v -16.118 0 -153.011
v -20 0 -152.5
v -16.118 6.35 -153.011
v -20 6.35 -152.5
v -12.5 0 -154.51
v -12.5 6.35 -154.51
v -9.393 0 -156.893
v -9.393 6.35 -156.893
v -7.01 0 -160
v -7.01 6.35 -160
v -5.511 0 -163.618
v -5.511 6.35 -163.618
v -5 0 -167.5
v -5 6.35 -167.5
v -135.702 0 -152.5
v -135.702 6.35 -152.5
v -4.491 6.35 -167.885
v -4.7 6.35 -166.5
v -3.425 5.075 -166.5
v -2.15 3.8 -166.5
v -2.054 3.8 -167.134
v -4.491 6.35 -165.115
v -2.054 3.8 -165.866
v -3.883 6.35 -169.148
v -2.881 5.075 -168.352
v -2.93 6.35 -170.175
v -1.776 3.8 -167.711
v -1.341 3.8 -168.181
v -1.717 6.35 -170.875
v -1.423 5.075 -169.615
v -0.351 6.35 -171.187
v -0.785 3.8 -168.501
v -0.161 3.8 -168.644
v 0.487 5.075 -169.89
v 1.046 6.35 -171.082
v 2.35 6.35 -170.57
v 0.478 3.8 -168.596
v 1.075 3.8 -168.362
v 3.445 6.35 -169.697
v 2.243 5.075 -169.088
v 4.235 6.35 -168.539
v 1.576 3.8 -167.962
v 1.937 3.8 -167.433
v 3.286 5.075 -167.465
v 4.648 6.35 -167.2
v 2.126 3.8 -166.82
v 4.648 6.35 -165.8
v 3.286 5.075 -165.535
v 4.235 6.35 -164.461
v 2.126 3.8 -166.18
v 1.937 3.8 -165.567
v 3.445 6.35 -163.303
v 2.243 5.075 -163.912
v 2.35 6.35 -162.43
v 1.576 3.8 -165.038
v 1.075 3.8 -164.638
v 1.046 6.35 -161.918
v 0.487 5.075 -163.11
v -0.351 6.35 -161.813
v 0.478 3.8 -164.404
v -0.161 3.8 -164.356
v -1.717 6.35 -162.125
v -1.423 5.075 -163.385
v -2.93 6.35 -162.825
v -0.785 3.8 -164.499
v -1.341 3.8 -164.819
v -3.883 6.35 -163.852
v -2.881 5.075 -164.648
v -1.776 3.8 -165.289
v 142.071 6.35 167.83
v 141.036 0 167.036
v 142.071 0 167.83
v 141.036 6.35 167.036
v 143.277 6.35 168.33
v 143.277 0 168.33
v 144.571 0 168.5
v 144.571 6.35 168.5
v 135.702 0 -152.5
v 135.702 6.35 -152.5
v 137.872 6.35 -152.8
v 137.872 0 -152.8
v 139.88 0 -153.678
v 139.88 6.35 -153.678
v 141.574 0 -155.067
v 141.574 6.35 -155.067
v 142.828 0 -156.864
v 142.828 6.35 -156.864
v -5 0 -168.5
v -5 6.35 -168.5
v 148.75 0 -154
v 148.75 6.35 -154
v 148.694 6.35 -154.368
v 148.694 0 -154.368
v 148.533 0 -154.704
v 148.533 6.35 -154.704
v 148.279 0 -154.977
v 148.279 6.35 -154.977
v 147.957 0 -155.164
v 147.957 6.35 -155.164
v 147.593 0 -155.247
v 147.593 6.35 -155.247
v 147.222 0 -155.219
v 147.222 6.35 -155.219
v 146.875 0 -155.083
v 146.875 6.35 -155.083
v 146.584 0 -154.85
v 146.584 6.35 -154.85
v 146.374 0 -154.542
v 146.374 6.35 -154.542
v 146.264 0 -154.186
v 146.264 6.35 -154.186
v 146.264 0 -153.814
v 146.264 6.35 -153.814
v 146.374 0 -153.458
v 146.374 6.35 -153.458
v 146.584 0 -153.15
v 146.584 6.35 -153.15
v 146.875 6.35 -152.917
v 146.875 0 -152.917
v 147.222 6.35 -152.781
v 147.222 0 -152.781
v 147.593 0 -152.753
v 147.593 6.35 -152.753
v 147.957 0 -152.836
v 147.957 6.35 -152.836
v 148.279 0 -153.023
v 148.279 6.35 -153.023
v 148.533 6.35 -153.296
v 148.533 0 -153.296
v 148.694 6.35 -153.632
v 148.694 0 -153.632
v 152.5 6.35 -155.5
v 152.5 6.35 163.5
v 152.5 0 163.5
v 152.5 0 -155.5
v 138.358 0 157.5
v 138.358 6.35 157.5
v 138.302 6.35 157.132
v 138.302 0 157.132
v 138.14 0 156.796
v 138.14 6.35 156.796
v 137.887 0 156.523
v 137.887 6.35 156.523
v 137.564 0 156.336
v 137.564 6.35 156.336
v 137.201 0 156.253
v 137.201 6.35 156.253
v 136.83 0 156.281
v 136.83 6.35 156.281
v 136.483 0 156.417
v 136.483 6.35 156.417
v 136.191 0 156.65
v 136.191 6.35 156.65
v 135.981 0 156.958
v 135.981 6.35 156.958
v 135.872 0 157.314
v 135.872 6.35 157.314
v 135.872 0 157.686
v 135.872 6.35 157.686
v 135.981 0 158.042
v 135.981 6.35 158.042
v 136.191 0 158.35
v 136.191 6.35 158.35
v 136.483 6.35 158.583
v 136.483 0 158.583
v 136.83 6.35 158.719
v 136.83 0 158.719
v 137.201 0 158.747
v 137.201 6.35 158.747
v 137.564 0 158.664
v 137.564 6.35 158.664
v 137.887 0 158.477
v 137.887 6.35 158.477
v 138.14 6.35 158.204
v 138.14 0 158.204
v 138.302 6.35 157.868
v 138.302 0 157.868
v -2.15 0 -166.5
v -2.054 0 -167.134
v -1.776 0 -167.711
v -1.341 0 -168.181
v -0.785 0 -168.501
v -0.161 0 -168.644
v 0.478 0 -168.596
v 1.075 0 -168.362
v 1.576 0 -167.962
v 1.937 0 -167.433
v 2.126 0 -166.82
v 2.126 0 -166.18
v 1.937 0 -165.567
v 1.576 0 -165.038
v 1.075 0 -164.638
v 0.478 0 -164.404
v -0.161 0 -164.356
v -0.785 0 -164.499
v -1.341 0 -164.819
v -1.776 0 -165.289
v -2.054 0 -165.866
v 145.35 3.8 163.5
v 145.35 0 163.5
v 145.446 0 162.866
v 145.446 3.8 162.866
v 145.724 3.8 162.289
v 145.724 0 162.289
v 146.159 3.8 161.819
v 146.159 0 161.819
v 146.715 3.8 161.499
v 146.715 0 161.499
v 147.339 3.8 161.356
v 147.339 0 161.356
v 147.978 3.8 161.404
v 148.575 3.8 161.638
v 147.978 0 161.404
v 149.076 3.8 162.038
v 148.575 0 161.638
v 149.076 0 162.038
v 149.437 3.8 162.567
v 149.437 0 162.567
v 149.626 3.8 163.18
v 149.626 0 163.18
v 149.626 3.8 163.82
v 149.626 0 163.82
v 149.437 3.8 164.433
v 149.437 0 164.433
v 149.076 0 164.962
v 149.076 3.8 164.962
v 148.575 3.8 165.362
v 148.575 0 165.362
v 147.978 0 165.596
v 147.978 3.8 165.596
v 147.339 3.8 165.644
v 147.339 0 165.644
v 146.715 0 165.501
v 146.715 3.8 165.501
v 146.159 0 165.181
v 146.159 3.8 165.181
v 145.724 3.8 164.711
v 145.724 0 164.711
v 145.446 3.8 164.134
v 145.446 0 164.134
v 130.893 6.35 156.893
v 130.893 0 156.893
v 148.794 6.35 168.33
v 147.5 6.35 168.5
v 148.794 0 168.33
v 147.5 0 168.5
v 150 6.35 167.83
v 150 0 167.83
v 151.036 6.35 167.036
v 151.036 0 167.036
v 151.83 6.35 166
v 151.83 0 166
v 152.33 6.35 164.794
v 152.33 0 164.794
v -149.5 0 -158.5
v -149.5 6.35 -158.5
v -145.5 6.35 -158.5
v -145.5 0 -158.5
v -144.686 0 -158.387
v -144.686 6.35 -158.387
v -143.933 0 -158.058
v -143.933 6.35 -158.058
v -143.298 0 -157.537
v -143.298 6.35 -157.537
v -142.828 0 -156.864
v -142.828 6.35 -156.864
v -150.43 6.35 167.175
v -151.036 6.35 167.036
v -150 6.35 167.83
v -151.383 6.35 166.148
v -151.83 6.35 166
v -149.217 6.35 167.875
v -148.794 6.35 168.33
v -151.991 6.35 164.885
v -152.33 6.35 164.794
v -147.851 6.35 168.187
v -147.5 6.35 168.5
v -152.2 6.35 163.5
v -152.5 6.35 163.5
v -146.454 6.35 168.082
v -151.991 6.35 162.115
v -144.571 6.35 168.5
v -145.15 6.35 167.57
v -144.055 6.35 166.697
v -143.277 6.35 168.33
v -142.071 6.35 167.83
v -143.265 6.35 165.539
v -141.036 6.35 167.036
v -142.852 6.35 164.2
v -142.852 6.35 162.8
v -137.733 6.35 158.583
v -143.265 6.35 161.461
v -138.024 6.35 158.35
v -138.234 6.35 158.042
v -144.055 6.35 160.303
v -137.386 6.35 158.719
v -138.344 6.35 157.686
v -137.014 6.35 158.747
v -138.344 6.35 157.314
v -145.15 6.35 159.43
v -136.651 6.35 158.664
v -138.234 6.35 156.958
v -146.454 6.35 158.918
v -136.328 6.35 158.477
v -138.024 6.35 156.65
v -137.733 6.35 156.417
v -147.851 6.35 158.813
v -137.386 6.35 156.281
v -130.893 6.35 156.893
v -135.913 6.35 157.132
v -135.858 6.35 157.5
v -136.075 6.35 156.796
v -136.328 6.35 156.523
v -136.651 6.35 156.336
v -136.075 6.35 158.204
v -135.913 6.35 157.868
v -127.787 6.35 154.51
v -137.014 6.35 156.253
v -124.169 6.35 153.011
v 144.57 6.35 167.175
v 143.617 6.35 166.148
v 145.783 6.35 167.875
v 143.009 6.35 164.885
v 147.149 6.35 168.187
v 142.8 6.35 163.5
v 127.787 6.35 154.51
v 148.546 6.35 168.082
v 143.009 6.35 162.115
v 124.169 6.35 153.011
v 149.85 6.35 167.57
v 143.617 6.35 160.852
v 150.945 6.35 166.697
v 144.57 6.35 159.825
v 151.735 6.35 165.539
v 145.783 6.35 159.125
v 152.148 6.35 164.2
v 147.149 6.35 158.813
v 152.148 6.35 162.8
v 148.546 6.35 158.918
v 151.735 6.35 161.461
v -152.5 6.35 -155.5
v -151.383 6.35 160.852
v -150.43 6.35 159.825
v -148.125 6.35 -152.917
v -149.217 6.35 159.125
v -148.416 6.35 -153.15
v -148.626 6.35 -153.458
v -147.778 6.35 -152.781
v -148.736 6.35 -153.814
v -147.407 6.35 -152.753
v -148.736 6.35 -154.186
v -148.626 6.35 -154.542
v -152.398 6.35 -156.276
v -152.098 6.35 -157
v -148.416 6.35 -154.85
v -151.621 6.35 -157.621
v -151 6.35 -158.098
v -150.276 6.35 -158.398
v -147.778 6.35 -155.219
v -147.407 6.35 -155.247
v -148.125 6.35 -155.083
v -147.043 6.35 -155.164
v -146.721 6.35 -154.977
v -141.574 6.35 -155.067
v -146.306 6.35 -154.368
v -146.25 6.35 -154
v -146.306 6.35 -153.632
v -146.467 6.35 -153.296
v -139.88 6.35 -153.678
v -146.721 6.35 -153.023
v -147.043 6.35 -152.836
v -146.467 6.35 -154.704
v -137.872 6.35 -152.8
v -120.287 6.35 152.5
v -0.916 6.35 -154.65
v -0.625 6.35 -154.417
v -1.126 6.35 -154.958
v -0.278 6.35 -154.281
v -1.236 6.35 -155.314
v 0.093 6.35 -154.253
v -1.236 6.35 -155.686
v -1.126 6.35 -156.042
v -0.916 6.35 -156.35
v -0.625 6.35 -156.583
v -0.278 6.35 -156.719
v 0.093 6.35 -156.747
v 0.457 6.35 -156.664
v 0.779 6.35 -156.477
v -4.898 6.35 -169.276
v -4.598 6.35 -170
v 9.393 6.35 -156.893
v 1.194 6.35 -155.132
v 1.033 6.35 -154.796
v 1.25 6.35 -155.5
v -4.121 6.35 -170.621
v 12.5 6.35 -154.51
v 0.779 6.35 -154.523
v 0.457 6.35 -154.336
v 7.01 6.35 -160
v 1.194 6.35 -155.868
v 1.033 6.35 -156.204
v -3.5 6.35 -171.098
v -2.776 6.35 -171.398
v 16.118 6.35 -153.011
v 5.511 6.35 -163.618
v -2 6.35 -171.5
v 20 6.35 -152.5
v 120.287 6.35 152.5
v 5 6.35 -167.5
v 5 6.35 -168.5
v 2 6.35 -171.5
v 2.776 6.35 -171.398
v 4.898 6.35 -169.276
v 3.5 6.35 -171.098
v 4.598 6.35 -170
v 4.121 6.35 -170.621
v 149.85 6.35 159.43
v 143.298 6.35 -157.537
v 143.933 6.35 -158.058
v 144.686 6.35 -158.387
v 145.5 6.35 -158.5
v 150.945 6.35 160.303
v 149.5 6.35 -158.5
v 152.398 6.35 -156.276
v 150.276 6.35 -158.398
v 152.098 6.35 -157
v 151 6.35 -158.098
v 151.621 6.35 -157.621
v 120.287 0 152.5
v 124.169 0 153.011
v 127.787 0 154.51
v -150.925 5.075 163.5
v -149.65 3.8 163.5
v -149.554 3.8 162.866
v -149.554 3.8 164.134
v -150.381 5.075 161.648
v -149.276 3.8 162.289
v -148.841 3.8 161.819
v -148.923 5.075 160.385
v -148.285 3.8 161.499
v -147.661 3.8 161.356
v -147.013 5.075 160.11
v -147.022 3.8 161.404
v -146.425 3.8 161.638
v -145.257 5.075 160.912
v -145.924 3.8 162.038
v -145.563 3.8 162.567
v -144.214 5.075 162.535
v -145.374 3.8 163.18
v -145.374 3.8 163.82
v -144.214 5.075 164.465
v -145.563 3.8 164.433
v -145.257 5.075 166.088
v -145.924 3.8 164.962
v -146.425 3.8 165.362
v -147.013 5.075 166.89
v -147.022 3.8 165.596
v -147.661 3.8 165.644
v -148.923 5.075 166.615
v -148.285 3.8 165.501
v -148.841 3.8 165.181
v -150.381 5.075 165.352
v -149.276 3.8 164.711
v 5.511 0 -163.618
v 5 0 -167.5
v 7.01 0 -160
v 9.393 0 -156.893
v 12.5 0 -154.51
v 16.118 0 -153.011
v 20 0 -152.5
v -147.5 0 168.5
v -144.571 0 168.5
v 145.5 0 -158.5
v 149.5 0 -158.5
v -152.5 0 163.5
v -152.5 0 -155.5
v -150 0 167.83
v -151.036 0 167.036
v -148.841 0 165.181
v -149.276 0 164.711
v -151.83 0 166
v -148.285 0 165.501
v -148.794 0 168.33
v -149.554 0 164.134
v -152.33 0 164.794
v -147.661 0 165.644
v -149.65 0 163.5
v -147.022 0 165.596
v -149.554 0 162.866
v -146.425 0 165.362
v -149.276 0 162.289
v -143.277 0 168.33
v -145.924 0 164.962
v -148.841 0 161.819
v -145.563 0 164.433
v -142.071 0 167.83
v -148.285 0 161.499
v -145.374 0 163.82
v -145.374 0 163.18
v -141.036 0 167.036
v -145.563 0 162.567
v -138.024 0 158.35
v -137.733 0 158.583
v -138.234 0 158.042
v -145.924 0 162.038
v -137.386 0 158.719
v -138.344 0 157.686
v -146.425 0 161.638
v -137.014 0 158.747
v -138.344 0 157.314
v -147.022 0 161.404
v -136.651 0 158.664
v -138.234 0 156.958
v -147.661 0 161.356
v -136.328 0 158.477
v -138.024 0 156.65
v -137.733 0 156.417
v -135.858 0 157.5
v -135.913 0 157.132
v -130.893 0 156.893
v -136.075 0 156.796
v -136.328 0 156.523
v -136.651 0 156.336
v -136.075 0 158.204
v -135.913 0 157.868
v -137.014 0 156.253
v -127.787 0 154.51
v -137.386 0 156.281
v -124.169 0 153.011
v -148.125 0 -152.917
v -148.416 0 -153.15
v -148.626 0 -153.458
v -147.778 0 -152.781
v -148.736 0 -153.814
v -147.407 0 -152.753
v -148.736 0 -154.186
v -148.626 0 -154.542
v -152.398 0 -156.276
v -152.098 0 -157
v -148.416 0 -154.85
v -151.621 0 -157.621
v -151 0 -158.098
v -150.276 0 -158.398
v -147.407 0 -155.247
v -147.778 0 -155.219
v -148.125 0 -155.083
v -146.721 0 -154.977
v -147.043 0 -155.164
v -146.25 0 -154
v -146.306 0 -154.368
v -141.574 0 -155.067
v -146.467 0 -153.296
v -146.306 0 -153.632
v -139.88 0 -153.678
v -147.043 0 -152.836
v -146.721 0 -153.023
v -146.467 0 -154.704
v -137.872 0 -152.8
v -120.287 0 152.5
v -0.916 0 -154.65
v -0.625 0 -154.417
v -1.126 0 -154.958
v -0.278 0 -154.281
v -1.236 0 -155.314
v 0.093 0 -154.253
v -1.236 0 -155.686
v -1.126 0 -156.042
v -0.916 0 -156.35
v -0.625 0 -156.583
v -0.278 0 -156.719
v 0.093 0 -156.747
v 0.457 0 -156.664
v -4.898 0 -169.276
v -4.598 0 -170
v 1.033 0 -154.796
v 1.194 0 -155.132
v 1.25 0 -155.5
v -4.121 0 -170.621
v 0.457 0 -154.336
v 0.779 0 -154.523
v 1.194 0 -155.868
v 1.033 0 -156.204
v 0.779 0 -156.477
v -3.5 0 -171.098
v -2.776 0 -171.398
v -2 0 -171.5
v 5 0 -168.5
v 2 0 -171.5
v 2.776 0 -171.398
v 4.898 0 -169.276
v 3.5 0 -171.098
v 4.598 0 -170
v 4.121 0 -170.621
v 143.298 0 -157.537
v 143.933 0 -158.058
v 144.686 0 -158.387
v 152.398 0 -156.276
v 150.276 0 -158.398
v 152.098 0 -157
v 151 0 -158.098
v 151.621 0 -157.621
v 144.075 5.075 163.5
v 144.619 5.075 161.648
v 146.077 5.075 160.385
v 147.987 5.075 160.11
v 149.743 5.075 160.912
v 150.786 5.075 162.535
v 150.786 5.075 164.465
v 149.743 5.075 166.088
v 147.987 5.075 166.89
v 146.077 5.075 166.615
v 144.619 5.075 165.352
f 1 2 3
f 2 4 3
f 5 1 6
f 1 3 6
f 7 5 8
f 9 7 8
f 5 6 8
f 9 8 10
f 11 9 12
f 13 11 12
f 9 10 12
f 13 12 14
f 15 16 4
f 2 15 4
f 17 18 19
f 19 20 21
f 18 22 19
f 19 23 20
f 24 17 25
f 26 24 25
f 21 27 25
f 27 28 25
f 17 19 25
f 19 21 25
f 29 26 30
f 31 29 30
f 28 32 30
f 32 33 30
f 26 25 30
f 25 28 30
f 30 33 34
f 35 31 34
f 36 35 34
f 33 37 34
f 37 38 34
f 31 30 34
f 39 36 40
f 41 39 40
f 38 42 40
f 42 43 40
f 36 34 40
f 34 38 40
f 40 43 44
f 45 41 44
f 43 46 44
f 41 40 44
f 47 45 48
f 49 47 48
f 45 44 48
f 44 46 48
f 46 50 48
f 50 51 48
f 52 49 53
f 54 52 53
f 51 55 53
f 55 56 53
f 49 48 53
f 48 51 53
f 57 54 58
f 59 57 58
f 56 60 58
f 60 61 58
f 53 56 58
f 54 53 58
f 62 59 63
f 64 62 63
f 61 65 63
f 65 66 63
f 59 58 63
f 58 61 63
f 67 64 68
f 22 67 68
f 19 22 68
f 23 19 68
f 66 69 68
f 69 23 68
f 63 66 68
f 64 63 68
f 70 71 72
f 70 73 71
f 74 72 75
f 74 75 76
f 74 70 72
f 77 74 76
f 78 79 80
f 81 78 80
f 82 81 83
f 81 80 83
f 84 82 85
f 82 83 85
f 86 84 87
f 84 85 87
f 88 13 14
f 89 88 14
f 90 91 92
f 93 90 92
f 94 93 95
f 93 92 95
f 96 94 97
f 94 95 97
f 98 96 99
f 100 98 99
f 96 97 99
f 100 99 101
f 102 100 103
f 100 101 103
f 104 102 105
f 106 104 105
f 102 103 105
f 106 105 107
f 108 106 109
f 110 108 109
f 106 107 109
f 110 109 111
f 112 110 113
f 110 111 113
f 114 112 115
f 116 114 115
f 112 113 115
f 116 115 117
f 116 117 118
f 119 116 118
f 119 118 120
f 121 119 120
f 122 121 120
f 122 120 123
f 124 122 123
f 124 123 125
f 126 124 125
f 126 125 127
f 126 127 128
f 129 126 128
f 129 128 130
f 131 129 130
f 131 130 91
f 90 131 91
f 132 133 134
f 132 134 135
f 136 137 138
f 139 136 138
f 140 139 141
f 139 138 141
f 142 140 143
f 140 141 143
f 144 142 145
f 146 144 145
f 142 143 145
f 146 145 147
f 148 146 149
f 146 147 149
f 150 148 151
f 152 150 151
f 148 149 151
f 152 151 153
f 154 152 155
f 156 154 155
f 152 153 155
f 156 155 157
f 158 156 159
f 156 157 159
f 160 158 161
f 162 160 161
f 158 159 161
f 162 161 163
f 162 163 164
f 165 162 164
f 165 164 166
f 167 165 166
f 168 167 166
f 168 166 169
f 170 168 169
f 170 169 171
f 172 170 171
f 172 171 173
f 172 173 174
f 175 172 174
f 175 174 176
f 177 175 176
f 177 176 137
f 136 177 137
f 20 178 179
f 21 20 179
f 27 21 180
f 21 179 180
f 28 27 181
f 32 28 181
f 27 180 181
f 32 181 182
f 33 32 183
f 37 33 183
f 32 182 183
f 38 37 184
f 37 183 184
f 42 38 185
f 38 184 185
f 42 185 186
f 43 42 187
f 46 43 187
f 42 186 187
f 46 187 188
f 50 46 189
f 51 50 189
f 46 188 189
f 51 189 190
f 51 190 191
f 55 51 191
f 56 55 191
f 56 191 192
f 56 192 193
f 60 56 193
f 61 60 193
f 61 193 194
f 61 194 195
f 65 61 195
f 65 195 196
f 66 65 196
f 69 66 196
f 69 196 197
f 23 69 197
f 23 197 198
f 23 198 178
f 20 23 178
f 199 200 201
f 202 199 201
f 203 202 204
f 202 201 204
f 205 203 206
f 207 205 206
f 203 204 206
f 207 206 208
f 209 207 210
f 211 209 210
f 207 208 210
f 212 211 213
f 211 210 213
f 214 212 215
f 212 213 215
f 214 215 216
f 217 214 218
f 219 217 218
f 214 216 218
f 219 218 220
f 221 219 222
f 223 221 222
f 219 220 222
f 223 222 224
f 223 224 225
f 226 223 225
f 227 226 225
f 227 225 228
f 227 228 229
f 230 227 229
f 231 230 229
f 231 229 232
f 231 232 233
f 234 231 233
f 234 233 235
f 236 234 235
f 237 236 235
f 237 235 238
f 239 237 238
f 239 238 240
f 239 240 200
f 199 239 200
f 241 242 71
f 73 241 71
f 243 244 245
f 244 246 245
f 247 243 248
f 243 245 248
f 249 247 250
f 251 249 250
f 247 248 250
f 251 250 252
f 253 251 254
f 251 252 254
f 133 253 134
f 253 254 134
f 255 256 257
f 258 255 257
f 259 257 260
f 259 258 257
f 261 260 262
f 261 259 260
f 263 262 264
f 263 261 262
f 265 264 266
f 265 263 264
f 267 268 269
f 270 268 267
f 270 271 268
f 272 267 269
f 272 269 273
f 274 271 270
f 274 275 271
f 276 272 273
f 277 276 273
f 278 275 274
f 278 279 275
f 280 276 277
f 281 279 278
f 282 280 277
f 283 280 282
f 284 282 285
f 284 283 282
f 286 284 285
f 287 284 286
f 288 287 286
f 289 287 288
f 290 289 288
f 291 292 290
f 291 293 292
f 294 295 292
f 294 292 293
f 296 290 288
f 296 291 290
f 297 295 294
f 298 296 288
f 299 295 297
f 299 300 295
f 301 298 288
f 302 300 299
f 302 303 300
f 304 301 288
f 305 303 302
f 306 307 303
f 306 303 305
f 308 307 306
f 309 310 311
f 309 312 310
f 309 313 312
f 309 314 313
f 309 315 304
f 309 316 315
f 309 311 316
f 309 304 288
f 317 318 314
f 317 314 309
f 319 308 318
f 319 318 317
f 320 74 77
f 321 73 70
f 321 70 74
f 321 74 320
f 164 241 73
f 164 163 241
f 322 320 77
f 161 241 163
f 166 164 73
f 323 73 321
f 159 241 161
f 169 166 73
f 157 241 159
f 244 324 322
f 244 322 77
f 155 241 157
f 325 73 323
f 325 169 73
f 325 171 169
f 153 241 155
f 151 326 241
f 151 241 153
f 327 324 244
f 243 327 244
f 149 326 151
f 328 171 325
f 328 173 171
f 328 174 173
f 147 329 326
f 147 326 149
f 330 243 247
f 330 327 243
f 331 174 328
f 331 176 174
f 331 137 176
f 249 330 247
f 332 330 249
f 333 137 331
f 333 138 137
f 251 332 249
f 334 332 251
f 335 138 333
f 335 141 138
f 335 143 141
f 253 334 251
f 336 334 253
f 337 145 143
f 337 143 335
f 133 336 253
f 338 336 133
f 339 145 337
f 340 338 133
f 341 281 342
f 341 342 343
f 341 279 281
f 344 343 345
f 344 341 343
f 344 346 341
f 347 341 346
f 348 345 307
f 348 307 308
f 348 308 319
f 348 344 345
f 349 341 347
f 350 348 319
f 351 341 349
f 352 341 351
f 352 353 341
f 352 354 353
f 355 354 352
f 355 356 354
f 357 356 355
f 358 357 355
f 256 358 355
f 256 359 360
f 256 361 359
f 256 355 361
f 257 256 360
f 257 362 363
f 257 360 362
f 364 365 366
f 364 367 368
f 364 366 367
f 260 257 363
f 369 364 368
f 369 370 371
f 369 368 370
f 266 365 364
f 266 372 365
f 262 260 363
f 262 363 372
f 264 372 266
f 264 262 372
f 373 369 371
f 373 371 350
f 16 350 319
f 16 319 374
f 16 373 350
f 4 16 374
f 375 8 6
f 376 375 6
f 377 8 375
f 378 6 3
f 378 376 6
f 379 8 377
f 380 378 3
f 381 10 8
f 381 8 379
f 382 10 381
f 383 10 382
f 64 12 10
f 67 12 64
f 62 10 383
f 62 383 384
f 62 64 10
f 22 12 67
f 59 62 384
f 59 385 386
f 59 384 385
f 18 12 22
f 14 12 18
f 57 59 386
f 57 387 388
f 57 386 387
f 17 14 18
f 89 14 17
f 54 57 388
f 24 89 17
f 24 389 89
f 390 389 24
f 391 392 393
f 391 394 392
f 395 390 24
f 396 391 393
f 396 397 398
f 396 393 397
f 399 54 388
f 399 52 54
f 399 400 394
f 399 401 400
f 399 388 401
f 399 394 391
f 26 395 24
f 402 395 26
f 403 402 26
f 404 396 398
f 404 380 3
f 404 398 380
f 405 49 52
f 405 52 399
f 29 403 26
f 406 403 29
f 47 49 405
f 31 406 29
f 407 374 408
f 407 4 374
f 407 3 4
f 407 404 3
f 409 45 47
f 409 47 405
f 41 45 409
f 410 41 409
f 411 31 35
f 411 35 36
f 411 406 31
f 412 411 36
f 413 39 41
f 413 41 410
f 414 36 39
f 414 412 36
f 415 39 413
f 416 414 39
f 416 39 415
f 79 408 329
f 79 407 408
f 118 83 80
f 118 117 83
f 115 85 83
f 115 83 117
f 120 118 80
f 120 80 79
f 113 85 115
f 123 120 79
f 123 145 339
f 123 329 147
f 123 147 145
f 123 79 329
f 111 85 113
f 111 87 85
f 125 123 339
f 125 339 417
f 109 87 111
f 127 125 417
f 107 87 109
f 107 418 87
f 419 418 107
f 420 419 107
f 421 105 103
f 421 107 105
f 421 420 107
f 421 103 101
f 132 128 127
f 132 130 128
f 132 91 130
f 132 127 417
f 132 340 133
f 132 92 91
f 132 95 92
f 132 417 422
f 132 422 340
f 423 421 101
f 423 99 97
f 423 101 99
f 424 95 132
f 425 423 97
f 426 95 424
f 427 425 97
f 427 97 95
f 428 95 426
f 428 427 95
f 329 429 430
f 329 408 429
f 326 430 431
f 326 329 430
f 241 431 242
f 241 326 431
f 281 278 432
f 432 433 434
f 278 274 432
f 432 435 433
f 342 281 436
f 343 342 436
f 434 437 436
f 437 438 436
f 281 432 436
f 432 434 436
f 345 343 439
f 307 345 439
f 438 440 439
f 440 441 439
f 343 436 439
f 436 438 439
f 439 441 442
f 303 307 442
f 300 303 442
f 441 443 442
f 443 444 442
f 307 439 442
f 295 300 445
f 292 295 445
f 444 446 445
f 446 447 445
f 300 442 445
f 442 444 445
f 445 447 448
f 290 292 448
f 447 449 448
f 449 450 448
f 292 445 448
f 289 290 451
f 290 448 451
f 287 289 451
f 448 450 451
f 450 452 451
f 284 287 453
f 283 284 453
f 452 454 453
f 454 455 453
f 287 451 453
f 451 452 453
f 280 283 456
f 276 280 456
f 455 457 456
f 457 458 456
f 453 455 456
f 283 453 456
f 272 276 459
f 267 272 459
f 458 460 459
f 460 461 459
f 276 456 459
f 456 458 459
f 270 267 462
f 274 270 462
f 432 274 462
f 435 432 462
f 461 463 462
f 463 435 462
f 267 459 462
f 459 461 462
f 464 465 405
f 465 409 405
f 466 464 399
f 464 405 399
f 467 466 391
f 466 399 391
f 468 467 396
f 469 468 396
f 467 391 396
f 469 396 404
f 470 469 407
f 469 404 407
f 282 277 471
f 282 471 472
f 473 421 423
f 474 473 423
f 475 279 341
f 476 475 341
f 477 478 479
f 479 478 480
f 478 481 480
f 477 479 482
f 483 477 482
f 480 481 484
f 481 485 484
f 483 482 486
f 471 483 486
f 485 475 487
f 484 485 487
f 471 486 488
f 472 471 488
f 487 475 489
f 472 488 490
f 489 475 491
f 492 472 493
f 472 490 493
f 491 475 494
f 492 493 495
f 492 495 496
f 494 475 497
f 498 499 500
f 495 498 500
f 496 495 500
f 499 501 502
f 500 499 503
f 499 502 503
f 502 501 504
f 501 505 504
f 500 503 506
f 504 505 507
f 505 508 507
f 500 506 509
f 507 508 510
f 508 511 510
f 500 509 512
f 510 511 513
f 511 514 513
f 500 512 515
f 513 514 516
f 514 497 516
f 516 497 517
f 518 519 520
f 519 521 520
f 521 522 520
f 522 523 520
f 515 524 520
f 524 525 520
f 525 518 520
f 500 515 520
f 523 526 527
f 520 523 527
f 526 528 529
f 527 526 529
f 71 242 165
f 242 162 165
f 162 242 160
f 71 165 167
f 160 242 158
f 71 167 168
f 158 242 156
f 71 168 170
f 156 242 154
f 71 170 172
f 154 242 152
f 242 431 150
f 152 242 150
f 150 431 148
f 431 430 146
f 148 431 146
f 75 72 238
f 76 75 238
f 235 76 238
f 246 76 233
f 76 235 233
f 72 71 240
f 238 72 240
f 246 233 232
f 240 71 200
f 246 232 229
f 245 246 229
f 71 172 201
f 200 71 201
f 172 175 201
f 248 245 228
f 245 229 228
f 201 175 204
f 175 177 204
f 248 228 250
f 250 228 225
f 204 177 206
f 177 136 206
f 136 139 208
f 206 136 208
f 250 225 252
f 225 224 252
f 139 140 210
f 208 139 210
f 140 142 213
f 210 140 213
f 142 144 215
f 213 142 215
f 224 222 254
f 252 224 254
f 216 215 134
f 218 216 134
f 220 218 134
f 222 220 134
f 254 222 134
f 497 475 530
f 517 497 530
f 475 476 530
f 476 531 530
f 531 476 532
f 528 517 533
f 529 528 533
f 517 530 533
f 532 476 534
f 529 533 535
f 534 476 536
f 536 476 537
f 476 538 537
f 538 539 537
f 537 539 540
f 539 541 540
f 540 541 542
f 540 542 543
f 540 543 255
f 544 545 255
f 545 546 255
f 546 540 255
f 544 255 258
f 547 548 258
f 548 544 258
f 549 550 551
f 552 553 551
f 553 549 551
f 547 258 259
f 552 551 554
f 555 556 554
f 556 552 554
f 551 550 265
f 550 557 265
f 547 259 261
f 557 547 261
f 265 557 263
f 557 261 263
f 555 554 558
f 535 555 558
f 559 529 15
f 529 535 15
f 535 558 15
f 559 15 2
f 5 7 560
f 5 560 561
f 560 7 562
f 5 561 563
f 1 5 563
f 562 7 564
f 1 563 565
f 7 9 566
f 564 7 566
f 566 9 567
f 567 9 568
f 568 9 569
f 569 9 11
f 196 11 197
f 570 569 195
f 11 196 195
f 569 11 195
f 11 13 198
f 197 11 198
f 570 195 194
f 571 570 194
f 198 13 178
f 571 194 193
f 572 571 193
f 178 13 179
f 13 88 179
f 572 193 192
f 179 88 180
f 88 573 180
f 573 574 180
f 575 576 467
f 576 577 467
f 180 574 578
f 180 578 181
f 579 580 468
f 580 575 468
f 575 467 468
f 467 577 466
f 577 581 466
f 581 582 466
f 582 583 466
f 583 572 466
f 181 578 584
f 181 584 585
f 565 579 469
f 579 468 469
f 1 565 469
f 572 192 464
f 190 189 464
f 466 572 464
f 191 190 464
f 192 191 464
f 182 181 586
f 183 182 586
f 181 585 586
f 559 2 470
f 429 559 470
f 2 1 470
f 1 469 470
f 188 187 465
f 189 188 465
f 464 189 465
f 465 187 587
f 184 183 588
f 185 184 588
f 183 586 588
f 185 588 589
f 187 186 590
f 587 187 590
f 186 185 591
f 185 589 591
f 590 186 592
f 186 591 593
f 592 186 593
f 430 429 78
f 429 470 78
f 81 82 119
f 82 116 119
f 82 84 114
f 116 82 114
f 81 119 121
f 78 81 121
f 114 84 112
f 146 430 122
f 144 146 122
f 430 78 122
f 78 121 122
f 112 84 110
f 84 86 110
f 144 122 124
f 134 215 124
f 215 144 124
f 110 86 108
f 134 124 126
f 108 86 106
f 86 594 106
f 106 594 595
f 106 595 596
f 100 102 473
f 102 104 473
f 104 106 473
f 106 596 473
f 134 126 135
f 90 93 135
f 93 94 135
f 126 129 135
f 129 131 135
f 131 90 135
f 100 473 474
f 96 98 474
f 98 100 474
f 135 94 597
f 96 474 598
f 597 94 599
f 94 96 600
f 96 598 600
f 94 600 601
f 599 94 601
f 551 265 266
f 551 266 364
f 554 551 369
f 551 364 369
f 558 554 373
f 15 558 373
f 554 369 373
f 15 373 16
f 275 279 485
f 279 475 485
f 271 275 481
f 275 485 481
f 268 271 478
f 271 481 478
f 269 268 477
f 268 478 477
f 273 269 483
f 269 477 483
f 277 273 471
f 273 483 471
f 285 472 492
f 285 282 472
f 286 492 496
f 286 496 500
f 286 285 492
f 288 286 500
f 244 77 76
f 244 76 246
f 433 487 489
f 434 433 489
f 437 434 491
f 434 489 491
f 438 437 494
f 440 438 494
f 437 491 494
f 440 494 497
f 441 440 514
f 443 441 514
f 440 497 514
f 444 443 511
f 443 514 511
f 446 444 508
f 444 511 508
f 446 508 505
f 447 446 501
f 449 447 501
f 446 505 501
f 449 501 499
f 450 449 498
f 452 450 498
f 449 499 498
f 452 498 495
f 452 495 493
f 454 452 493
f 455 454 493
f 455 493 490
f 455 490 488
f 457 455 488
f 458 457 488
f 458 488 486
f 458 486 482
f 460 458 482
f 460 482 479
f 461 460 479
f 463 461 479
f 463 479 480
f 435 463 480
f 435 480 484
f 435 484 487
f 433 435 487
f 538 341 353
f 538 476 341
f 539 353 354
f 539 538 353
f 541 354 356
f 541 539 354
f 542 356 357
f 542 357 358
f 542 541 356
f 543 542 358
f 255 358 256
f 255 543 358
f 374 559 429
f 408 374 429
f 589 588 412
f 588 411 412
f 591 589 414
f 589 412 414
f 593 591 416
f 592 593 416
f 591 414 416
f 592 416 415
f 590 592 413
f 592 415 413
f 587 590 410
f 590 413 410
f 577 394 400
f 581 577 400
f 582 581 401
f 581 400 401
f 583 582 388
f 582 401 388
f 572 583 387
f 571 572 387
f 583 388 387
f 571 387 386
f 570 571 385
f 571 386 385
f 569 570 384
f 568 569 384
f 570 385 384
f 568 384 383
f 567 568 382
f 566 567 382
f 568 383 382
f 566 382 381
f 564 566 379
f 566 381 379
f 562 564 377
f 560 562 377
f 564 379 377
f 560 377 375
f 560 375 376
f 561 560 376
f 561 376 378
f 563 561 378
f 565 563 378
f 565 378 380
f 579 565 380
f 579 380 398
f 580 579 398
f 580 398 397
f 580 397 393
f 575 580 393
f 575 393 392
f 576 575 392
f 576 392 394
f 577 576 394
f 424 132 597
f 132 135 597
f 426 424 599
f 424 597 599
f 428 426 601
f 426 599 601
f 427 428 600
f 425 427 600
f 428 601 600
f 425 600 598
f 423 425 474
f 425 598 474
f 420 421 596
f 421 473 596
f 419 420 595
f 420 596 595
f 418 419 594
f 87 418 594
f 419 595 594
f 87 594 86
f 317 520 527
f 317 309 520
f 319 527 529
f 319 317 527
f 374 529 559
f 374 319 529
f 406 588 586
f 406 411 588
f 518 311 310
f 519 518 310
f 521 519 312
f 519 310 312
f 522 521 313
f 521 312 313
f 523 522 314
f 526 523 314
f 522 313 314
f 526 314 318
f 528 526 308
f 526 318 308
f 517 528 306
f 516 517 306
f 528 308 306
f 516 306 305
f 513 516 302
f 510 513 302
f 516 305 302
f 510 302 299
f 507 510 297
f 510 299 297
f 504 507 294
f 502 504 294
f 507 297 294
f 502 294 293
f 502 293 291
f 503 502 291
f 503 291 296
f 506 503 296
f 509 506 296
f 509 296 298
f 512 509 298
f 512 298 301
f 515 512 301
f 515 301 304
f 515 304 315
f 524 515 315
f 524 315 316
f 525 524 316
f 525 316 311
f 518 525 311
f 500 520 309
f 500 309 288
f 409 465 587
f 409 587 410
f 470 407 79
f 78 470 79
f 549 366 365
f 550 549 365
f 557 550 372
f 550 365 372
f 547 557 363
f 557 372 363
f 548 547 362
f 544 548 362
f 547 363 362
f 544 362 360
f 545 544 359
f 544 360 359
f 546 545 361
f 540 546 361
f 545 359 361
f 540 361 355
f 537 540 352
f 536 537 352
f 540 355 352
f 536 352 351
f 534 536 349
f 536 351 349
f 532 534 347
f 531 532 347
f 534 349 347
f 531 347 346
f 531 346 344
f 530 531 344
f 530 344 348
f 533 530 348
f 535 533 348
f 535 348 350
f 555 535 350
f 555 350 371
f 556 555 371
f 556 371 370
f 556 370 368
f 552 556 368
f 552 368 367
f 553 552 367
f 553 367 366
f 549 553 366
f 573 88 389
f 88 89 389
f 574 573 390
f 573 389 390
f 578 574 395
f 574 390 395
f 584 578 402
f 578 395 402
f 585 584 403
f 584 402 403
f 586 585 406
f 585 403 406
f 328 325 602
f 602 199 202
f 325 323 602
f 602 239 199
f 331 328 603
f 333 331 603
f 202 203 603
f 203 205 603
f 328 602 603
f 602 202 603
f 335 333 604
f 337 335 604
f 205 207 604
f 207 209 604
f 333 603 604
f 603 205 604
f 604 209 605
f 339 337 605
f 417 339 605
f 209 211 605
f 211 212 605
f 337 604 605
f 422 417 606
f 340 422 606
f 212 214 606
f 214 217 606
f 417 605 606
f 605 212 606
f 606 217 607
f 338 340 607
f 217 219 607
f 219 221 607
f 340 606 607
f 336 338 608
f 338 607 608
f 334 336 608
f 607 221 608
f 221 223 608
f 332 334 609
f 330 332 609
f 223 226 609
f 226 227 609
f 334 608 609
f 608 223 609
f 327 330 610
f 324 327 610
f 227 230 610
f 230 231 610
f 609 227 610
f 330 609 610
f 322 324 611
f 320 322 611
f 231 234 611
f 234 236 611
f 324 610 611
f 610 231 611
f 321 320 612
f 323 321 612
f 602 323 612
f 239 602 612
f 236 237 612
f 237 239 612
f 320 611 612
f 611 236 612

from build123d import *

# Parameters (mm, degrees)
SKETCH1_W                      = 305
SKETCH1_H                      = 327
BOSS_EXTRUDE1_DEPTH            = 6.35
CUT_EXTRUDE1_DEPTH             = 7.35
SKETCH3_W                      = 10
SKETCH3_H                      = 6.35
BOSS_EXTRUDE2_DEPTH            = 19
SKETCH4_W                      = 253
SKETCH4_H                      = 16
CUT_EXTRUDE2_DEPTH             = 7.35
DRAFT1_ANGLE                   = 45
F_4_3_4_3_DIAMETER_HOLE1_D     = 4.3
F_2_5_2_5_DIAMETER_HOLE1_D     = 2.5
F_2_5_2_5_DIAMETER_HOLE1_DEPTH = 6.35
CHAMFER1_SIZE                  = 2.55
FILLET1_R                      = 3
FILLET2_R                      = 5
FILLET3_R                      = 15


with BuildPart() as part:
    # Sketch1 → Boss-Extrude1 (new body)
    with BuildSketch(Plane(origin=(0, 6.35, 0), x_dir=(1, 0, 0), z_dir=(0, 1, 0))):
        with Locations((0, -5)):
            Rectangle(SKETCH1_W, SKETCH1_H)
    extrude(amount=-BOSS_EXTRUDE1_DEPTH)

    # Sketch2 → Cut-Extrude1 (cut, through all)
    with BuildSketch(Plane(origin=(0, 6.35, 0), x_dir=(-1, 0, 0), z_dir=(0, 1, 0))):
        with BuildLine():
            Line((-143.448007721, -158.5), (143.448007721, -158.5))
            ThreePointArc((143.448007721, -158.5), (140.601020514, -154.17544468), (135.702041029, -152.5))
            Line((135.702041029, -152.5), (-135.702041029, -152.5))
            ThreePointArc((-135.702041029, -152.5), (-140.601020514, -154.17544468), (-143.448007721, -158.5))
        make_face()
    extrude(amount=-CUT_EXTRUDE1_DEPTH, mode=Mode.SUBTRACT)

    # Sketch3 → Boss-Extrude2 (add)
    with BuildSketch(Plane(origin=(0, 0, -152.5), x_dir=(-1, 0, 0), z_dir=(0, 0, -1))):
        with Locations((0, 3.175)):
            Rectangle(SKETCH3_W, SKETCH3_H)
    extrude(amount=BOSS_EXTRUDE2_DEPTH)

    # Sketch4 → Cut-Extrude2 (cut, through all)
    with BuildSketch(Plane.XZ):
        with Locations((0, 160.5)):
            Rectangle(SKETCH4_W, SKETCH4_H)
    extrude(amount=-CUT_EXTRUDE2_DEPTH, mode=Mode.SUBTRACT)

    # Draft1
    draft1_faces = [part.faces().sort_by_distance(p)[0] for p in [
        (-126.5, 3.175, 160.5),
        (126.5, 3.175, 160.5),
    ]]
    draft(draft1_faces, Plane(origin=(-126.5, 6.35, 152.5), x_dir=(1, 0, 0), z_dir=(0, 0, 1)), DRAFT1_ANGLE)

    # Ø4.3 (4.3) Diameter Hole1 (through all)
    with Locations(Plane(origin=(0, 6.35, 0), x_dir=(1, 0, 0), z_dir=(0, 1, 0))):
        with Locations((0, 166.5), (-147.5, -163.5), (147.5, -163.5)):
            Hole(F_4_3_4_3_DIAMETER_HOLE1_D / 2)

    # Ø2.5 (2.5) Diameter Hole1
    with Locations(Plane(origin=(0, 0, 0), x_dir=(-1, 0, 0), z_dir=(0, -1, 0))):
        with Locations((147.5, 154), (-147.5, 154), (-137.107695155, -157.5), (137.107695155, -157.5), (0, 155.5)):
            Hole(F_2_5_2_5_DIAMETER_HOLE1_D / 2, depth=F_2_5_2_5_DIAMETER_HOLE1_DEPTH)

    # Chamfer1
    chamfer1_edges = [part.edges().sort_by_distance(p)[0] for p in [
        (149.65, 6.35, 163.5),
        (-145.35, 6.35, 163.5),
        (2.15, 6.35, -166.5),
    ]]
    chamfer(chamfer1_edges, length=CHAMFER1_SIZE)

    # Fillet1
    fillet1_edges = [part.edges().sort_by_distance(p)[0] for p in [
        (143.448007721, 3.175, -158.5),
        (-143.448007721, 3.175, -158.5),
        (-5, 3.175, -171.5),
        (5, 3.175, -171.5),
        (-152.5, 3.175, -158.5),
        (152.5, 3.175, -158.5),
    ]]
    fillet(fillet1_edges, radius=FILLET1_R)

    # Fillet2
    fillet2_edges = [part.edges().sort_by_distance(p)[0] for p in [
        (-142.5, 3.175, 168.5),
        (142.5, 3.175, 168.5),
        (152.5, 3.175, 168.5),
        (-152.5, 3.175, 168.5),
    ]]
    fillet(fillet2_edges, radius=FILLET2_R)

    # Fillet3
    fillet3_edges = [part.edges().sort_by_distance(p)[0] for p in [
        (-5, 3.175, -152.5),
        (5, 3.175, -152.5),
        (126.5, 3.175, 152.5),
        (-126.5, 3.175, 152.5),
    ]]
    fillet(fillet3_edges, radius=FILLET3_R)


solid = part.part
